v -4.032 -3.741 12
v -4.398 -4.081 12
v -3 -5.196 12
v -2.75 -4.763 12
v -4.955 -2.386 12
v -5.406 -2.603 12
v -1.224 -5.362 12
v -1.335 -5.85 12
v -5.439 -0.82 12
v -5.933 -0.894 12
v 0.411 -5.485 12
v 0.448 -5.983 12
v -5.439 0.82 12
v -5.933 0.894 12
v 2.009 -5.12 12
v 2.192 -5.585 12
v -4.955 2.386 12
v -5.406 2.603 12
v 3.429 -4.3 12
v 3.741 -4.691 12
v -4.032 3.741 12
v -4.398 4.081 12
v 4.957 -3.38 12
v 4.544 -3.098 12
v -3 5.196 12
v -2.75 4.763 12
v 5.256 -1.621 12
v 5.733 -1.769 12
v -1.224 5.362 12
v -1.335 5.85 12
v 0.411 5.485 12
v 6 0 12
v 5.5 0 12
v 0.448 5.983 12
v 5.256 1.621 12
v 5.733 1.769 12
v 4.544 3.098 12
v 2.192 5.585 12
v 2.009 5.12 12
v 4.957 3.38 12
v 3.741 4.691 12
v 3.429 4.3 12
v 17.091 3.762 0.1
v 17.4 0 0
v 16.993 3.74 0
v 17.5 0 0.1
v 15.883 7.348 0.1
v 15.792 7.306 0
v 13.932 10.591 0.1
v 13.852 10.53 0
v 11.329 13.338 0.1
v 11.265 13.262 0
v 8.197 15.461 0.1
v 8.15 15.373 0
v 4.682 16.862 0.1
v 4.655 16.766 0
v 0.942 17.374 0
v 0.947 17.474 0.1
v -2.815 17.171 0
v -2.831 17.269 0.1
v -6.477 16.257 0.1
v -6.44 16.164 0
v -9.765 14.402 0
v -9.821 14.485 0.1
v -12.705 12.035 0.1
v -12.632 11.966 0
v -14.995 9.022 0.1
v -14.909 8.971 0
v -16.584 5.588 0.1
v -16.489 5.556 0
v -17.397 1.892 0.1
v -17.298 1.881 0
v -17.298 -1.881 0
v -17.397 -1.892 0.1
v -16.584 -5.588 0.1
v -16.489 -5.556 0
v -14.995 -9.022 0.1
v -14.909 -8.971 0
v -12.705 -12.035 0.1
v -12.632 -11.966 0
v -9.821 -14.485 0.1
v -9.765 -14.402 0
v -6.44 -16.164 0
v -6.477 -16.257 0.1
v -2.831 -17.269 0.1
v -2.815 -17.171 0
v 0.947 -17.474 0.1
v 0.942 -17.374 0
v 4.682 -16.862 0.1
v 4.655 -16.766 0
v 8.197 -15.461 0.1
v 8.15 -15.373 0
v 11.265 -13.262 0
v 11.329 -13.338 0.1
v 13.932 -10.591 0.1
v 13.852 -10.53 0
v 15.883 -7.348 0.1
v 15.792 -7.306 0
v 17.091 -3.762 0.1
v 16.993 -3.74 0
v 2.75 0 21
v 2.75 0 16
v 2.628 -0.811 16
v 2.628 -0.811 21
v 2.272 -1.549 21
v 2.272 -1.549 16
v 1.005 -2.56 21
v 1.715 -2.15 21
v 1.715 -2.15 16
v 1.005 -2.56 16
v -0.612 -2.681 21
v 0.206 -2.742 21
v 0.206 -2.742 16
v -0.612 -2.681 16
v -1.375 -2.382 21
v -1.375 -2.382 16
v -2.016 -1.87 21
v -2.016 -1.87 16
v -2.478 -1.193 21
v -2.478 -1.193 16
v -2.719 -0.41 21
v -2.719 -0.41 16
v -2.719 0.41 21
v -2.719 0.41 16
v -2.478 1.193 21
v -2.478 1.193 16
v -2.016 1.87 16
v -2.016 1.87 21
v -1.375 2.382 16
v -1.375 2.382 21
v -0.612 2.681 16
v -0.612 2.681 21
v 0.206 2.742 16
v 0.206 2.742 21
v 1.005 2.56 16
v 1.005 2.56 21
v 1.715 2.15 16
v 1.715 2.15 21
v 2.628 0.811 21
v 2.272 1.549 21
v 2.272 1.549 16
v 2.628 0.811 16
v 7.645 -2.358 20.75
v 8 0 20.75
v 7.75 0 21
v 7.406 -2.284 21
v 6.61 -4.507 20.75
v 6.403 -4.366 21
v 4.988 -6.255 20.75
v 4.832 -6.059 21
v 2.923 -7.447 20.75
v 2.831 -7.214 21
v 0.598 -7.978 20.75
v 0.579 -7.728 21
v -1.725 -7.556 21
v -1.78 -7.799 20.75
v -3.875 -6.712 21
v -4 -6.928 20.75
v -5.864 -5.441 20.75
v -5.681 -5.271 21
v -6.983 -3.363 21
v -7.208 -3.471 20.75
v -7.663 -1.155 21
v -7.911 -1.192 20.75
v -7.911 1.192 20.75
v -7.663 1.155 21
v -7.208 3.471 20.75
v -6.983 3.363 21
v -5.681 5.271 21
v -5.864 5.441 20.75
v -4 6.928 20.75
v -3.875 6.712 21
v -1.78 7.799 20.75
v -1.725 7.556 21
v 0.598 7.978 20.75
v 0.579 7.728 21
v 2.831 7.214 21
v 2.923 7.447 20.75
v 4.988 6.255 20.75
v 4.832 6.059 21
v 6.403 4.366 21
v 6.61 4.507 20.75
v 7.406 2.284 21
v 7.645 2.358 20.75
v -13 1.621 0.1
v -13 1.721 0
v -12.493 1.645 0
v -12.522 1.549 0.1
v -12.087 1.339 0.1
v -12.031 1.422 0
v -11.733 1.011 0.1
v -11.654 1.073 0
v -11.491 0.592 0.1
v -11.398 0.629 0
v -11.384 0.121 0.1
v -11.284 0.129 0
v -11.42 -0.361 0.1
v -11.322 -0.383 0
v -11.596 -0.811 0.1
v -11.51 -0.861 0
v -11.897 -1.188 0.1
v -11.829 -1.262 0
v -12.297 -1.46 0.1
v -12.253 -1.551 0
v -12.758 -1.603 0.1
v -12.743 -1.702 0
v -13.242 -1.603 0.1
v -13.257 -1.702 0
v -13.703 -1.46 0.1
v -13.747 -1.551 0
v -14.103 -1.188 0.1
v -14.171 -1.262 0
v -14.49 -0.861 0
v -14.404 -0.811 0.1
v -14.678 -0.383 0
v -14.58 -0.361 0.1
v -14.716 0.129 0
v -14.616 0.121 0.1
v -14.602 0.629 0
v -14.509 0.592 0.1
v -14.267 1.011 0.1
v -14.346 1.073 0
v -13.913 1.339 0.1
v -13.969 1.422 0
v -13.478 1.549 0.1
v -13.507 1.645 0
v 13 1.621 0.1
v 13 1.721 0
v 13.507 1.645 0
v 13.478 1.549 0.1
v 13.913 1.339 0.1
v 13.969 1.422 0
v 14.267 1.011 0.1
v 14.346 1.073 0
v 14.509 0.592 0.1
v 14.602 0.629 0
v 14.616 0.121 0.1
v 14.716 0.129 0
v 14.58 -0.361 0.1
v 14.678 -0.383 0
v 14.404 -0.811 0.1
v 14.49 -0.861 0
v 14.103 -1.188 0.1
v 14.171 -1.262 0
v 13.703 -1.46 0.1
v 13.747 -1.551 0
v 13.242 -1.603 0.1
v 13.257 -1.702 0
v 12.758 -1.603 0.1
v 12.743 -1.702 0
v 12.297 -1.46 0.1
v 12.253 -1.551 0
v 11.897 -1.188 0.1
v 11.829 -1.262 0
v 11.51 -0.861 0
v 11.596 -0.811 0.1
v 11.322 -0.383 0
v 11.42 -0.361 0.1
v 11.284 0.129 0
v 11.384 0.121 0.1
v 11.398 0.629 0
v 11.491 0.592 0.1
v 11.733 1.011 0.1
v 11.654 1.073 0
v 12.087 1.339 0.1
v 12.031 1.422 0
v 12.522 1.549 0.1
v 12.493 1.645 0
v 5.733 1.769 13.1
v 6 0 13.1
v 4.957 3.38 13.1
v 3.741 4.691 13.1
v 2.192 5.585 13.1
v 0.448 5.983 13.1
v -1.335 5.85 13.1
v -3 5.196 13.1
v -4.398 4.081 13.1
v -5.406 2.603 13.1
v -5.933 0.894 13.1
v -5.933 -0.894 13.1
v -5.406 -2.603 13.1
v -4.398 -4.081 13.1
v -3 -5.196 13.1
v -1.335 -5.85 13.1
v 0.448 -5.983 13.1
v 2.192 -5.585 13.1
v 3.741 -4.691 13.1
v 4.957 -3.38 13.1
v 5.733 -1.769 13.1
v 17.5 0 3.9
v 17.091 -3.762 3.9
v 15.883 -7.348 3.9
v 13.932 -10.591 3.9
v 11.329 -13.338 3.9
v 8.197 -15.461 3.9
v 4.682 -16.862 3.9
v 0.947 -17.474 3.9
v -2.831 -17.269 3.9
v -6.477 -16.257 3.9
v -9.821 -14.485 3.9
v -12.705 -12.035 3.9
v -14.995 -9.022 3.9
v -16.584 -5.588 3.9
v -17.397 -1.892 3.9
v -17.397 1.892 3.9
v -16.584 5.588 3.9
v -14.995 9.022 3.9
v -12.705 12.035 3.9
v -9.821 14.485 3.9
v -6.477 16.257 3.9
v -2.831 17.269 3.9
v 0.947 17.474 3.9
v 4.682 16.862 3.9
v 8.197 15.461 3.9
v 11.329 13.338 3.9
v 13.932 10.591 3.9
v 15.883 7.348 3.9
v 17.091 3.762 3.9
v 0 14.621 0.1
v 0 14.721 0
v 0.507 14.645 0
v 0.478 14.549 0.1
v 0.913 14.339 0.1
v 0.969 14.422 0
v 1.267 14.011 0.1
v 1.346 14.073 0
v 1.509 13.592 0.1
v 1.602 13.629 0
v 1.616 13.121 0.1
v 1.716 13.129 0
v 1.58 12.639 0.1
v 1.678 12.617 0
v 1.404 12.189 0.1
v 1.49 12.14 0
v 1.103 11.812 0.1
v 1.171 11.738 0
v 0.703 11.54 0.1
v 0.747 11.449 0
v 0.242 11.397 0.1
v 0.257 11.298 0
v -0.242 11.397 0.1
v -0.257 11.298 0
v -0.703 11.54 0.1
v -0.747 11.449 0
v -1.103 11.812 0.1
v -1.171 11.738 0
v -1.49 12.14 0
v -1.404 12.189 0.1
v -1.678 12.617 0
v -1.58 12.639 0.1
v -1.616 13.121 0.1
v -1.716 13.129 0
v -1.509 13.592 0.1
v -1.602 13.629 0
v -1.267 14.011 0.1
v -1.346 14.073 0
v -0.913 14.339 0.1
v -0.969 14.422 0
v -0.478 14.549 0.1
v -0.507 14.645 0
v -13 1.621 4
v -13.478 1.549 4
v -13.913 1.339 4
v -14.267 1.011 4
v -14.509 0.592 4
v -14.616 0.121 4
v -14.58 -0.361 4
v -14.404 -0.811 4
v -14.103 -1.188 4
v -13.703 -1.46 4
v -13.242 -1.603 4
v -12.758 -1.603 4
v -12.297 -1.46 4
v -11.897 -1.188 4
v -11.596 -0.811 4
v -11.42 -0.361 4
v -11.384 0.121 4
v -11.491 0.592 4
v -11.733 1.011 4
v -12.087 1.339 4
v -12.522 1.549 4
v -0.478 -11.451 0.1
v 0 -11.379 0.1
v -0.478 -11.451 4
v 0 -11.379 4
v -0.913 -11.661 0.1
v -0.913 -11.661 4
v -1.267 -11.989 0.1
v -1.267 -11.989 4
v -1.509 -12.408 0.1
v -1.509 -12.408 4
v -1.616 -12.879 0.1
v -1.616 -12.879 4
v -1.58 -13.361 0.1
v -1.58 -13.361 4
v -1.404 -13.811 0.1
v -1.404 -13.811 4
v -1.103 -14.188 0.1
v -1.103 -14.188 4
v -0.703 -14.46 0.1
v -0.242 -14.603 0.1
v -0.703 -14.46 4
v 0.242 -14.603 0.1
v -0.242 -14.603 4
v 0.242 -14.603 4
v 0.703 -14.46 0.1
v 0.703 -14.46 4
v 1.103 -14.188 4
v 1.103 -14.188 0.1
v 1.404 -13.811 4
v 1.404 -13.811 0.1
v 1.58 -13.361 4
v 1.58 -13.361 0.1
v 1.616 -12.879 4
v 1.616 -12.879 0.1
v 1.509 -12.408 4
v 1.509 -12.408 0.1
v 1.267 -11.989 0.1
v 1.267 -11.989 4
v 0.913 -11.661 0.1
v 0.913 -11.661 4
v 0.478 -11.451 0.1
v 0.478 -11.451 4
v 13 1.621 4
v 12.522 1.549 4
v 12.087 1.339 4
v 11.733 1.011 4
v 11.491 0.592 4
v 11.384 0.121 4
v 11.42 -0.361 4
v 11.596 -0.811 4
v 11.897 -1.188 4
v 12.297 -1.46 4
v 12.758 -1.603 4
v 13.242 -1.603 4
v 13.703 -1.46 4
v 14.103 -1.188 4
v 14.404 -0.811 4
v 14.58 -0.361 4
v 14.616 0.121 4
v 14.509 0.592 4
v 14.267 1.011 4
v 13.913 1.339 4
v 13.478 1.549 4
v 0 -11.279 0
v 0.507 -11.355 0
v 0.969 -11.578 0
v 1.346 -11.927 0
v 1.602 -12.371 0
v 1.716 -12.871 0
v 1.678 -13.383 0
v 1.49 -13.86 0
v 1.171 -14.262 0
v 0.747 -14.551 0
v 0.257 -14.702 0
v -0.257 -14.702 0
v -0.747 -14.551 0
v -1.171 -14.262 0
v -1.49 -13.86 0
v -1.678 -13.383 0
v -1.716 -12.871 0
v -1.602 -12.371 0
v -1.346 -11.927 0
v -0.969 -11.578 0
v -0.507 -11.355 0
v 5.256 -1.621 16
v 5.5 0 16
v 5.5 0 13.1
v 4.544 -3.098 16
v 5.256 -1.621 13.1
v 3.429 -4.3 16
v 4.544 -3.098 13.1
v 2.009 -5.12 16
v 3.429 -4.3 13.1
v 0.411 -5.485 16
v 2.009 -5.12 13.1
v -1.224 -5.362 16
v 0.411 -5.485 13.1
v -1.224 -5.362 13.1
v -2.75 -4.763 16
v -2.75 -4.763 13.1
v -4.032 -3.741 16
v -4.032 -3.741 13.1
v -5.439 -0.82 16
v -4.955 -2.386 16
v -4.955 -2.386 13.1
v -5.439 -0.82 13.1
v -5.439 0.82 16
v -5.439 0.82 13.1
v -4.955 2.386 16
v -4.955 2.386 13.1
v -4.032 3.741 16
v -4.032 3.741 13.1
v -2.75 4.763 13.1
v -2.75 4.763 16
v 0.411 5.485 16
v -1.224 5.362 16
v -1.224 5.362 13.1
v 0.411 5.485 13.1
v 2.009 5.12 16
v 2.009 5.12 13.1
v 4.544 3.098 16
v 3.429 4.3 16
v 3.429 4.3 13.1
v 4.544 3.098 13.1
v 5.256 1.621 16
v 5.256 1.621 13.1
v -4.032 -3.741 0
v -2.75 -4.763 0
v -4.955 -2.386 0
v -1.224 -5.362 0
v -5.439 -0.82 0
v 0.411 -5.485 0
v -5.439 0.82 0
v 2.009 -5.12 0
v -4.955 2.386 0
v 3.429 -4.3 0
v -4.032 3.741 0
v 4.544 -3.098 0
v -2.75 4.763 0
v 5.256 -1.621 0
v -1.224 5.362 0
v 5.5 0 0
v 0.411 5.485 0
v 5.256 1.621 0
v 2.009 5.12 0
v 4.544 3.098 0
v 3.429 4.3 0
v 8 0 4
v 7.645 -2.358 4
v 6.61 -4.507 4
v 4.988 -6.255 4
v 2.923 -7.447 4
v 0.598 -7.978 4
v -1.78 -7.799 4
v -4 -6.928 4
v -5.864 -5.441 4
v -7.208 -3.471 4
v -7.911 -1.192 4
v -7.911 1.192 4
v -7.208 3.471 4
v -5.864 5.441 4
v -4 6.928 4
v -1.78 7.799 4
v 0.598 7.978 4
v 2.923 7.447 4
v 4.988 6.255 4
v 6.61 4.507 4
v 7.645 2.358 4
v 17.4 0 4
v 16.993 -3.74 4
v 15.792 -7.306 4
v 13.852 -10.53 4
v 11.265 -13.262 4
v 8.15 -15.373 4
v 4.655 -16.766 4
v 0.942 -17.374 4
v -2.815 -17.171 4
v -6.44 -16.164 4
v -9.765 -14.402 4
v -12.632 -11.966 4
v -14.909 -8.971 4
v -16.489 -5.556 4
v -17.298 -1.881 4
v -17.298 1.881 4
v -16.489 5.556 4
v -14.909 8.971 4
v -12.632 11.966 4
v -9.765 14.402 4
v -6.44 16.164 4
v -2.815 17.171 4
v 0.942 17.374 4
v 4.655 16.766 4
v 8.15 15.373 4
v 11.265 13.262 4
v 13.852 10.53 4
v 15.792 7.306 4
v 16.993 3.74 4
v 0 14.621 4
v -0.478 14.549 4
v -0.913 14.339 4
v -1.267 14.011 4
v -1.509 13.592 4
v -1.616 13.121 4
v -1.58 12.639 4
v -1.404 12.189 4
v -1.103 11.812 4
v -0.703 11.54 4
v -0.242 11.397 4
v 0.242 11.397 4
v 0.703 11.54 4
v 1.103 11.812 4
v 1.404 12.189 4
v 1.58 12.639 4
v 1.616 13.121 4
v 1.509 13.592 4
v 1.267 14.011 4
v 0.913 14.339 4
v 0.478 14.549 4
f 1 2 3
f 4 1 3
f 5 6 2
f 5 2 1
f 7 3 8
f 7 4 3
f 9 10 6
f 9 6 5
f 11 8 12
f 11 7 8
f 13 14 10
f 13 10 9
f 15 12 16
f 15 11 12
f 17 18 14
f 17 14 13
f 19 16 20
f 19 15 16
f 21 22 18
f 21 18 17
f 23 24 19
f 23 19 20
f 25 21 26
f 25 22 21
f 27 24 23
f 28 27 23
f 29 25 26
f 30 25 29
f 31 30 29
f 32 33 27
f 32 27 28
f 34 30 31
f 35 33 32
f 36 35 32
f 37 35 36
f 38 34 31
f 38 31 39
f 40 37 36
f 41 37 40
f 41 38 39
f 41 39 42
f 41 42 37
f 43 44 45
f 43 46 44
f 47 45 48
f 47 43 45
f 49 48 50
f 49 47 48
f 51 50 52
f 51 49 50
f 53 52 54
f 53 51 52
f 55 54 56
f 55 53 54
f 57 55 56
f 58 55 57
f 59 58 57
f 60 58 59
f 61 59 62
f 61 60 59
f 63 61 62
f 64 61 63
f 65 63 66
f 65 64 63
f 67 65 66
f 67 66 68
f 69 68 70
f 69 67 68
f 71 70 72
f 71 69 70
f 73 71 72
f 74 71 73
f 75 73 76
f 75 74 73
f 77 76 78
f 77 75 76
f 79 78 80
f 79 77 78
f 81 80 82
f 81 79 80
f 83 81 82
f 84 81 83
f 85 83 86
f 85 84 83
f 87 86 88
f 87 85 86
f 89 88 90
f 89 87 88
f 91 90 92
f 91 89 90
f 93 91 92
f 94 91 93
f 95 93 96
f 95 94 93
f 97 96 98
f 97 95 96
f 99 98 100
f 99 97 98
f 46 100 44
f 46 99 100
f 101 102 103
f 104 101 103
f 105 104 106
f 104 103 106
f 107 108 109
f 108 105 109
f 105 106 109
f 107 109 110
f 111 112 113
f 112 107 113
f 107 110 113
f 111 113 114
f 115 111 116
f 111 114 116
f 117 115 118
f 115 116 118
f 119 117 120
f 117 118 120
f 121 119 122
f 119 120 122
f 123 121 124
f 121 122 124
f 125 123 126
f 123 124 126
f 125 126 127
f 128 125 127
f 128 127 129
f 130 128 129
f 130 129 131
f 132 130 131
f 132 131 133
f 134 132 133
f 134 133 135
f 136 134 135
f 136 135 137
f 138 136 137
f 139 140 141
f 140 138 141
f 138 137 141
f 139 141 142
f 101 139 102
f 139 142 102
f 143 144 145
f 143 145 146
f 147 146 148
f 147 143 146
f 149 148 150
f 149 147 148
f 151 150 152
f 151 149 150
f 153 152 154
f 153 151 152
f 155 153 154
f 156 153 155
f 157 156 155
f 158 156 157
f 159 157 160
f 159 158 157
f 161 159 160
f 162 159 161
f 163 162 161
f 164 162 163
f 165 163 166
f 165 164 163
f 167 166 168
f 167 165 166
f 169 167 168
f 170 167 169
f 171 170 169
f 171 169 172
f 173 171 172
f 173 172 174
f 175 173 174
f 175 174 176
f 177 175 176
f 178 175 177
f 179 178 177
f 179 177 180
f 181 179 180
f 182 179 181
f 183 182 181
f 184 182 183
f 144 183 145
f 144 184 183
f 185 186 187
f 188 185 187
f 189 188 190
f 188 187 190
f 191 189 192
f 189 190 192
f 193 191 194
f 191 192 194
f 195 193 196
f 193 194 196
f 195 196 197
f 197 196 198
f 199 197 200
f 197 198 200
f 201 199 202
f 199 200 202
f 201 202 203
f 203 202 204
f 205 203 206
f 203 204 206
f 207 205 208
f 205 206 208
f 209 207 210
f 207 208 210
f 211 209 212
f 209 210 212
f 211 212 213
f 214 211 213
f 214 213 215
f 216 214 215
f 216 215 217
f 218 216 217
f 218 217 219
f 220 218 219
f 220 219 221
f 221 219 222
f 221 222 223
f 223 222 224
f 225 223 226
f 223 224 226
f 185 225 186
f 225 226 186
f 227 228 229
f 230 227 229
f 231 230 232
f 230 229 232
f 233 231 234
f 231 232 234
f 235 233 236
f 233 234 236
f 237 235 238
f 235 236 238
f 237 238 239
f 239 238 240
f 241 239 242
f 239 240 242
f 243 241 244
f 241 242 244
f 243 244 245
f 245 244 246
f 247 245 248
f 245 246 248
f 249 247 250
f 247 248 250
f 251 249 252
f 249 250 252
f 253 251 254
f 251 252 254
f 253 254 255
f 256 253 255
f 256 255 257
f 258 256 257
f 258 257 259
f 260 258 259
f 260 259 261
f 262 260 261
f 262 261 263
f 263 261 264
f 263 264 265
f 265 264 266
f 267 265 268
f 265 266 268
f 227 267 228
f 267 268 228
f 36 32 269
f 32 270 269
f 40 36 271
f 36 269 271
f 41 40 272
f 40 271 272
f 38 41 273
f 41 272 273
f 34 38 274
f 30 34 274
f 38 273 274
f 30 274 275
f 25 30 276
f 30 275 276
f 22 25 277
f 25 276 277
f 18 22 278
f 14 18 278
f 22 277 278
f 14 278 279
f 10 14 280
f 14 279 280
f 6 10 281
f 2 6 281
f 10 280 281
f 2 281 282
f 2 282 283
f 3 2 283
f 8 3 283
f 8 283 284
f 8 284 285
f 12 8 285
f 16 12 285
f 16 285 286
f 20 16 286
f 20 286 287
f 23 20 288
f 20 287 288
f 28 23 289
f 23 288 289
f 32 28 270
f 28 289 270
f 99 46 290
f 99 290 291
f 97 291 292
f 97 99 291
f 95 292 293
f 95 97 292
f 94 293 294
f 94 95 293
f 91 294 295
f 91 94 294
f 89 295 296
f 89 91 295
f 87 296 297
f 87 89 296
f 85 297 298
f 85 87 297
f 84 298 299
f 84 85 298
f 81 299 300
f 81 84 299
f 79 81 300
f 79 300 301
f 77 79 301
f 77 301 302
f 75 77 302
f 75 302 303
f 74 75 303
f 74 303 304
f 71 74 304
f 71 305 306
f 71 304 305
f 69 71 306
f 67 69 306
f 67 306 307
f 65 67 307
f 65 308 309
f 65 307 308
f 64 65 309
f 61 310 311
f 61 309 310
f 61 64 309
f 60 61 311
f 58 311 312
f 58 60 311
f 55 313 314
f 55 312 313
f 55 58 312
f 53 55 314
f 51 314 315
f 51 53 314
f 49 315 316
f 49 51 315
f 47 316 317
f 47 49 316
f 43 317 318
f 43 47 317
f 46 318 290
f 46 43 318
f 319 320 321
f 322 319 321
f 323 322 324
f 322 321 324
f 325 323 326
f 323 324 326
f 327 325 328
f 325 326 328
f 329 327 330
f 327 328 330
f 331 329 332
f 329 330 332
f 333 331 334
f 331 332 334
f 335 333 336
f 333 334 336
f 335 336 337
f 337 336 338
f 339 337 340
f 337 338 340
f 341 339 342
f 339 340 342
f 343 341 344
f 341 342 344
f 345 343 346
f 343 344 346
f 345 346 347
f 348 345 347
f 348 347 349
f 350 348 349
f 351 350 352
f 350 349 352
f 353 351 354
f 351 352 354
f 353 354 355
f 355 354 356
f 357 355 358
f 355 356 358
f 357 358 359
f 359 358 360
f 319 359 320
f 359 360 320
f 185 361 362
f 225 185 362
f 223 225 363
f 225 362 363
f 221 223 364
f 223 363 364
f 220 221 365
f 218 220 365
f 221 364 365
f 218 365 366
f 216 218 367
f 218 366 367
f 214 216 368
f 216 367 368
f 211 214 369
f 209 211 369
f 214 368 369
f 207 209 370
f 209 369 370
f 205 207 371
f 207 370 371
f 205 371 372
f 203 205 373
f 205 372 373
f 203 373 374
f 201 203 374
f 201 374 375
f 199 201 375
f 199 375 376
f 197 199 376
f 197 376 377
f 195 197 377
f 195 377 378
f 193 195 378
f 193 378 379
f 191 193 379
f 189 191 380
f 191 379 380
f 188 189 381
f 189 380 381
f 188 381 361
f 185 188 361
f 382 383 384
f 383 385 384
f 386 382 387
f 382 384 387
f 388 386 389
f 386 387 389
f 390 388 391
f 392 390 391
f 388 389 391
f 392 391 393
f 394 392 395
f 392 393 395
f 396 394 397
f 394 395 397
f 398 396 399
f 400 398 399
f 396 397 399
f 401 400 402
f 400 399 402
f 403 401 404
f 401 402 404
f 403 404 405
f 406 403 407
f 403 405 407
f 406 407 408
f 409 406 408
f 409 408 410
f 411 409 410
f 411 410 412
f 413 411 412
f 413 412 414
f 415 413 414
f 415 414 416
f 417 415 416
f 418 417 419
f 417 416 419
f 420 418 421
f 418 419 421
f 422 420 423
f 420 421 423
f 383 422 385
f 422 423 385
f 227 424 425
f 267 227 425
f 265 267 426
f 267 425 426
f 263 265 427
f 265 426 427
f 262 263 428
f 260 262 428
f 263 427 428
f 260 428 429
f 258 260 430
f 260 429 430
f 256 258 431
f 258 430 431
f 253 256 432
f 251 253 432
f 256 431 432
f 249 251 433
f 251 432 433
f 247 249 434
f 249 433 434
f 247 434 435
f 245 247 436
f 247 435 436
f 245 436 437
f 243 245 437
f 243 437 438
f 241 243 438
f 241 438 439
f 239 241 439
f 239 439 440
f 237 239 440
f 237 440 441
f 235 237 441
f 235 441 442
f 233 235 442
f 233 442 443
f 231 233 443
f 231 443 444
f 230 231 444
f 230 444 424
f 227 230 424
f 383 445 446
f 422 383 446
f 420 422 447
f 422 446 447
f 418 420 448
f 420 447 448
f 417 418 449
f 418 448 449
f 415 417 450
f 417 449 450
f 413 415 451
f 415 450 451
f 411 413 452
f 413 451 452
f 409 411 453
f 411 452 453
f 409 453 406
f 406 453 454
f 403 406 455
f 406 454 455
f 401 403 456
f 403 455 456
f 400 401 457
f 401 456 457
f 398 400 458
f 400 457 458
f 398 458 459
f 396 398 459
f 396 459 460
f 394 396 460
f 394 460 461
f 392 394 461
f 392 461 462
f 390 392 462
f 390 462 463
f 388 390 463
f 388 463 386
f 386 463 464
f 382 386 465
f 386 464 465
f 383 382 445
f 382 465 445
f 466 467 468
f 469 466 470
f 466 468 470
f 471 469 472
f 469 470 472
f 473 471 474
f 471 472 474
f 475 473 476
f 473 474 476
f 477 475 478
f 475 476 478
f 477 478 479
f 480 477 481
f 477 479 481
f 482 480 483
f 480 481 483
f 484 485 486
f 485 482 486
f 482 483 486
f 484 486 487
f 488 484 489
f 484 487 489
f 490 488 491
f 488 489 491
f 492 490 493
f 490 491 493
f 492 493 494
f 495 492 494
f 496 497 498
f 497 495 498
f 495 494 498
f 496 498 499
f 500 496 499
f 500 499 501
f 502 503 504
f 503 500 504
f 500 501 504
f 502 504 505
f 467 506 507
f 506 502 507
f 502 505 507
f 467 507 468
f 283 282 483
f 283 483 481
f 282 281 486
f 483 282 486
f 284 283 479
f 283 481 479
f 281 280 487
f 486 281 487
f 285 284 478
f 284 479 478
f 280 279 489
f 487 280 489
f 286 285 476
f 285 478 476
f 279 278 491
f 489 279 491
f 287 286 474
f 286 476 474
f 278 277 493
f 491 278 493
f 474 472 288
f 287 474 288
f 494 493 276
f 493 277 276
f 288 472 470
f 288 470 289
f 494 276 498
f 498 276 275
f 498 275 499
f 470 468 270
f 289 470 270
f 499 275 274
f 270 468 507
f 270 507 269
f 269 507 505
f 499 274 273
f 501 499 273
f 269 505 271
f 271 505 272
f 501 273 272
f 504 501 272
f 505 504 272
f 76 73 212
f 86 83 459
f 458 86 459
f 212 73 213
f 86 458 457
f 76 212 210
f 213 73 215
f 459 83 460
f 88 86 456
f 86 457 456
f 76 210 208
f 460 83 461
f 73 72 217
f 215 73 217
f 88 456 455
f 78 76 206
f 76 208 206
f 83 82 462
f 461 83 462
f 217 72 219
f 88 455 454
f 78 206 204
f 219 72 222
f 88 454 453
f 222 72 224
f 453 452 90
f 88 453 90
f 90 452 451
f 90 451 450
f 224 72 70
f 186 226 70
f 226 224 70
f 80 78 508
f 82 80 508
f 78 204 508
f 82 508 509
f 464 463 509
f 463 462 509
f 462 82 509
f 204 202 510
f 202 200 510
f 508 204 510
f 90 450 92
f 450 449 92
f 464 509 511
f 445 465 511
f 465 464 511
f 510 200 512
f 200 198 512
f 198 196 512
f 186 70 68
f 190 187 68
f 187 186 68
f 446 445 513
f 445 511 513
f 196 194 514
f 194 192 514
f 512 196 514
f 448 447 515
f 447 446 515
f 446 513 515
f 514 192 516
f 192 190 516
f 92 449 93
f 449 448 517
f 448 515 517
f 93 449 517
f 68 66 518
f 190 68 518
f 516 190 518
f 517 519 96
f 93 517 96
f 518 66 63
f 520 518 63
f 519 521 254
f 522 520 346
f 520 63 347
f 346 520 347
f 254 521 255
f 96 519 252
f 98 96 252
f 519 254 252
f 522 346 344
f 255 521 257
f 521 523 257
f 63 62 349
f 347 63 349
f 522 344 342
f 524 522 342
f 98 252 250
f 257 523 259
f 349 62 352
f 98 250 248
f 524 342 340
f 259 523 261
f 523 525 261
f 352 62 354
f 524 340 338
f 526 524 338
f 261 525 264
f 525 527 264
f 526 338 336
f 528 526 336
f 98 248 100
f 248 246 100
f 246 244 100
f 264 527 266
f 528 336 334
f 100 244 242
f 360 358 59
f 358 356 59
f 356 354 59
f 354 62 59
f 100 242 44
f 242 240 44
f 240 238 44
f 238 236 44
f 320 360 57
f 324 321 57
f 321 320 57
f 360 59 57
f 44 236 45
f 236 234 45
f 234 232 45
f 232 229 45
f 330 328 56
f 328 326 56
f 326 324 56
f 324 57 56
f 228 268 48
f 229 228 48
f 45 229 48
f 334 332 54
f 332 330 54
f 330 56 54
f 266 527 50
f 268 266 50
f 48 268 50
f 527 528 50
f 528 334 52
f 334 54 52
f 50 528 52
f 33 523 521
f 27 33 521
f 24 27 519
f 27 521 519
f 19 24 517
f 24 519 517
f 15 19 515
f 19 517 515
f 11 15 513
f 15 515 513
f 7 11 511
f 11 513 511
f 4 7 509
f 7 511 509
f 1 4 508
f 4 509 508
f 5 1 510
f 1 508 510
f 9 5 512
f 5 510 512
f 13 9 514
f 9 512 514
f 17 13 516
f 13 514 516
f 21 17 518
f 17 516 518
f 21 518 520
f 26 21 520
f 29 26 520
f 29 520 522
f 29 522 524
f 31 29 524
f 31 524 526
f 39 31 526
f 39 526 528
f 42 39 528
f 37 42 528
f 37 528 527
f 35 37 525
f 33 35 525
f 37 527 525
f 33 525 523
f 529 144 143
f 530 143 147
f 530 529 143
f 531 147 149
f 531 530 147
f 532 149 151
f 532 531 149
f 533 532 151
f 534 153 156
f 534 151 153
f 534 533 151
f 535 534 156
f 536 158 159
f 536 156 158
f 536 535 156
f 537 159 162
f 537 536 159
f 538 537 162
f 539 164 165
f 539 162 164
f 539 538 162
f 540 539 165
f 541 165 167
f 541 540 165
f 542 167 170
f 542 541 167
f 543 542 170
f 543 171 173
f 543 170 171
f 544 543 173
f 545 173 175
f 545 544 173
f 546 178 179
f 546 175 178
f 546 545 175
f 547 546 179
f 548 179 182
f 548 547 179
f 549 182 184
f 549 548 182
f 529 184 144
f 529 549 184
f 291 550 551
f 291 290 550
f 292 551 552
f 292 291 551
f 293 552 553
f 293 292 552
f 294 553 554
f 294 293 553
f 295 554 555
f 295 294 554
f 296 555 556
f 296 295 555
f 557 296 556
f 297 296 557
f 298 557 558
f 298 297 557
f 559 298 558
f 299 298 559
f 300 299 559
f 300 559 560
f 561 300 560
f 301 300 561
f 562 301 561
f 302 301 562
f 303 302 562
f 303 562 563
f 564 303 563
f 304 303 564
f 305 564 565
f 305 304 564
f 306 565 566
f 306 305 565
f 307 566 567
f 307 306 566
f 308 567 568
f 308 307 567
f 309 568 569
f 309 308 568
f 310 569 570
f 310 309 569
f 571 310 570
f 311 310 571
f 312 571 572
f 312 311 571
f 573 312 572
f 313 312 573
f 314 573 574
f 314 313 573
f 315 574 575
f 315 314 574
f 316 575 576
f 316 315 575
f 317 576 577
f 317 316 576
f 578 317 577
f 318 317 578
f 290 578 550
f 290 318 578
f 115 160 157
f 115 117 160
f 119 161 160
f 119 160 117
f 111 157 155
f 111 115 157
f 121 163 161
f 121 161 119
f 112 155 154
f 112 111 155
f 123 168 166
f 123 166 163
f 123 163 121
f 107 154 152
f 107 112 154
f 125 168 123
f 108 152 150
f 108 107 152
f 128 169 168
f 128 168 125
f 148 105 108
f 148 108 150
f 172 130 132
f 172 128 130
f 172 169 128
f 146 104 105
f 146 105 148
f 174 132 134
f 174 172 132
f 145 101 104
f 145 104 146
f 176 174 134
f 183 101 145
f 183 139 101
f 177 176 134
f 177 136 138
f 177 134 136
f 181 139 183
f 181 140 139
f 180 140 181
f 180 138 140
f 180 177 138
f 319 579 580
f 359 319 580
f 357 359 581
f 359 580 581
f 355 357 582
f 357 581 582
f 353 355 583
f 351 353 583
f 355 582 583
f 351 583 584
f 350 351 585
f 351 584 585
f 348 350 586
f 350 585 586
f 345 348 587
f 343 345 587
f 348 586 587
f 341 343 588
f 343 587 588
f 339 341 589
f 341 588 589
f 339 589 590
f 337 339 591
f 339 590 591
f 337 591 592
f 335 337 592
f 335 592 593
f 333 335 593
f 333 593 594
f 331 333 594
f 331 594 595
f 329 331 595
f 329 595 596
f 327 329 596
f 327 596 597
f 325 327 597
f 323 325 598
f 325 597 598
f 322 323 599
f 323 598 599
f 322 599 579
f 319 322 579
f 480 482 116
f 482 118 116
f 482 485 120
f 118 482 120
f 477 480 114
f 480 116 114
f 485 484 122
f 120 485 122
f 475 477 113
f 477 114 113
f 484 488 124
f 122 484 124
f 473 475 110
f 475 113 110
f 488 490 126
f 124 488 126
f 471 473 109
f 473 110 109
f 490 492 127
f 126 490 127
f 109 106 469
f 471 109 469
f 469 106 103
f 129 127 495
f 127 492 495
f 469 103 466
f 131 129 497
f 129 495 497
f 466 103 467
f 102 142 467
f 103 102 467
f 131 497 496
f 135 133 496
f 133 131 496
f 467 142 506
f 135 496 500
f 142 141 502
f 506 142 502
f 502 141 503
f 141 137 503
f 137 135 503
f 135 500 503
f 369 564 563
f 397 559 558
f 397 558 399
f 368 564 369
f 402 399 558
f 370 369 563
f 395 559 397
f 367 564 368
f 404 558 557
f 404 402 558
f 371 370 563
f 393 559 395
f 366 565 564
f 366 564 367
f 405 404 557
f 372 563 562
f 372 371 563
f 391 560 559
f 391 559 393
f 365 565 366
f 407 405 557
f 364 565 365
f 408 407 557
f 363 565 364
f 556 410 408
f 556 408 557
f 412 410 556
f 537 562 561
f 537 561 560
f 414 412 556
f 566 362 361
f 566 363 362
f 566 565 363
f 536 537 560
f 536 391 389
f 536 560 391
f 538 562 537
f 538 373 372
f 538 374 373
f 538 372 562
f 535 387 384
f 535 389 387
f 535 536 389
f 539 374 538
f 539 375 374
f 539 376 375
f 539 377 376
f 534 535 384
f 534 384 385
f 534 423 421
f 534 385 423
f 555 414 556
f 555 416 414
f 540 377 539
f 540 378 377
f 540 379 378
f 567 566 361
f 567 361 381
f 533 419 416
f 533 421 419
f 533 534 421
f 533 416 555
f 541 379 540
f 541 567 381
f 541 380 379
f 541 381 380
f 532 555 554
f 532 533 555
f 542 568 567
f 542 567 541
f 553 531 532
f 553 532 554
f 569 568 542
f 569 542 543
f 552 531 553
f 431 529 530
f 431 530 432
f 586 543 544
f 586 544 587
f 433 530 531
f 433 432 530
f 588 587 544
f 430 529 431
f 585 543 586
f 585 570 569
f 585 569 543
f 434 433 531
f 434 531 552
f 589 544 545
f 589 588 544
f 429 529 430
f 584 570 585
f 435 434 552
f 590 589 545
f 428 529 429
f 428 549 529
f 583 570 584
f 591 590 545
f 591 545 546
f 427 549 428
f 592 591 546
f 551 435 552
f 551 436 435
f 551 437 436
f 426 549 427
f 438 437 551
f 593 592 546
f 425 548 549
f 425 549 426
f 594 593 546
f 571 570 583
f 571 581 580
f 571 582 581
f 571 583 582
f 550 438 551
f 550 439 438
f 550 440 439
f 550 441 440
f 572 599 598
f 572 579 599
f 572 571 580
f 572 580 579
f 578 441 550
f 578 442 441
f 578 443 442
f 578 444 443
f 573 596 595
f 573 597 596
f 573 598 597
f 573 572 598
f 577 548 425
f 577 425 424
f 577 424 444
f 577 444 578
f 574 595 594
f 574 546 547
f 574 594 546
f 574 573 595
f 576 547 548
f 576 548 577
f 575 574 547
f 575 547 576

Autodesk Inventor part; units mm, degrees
ref_plane "YZ Plane" through (0, 0, 0) normal (1, 0, 0) x (0, 1, 0)
ref_plane "XZ Plane" through (0, 0, 0) normal (0, 1, 0) x (-1, 0, 0)
sketch "Sketch1" plane through (0, 0, 0) normal (0, 0, 1) x (1, 0, 0)
  circle A0 centre (0, 0) radius 17.5
  circle A1 centre (0, 0) radius 8
  circle A2 centre (0, 0) radius 5.5
  circle A3 centre (0, 0) radius 2.75
  circle A4 centre (0, 0) radius 13 construction
  point P0 (0, 13)
  point P1 (-13, 0)
  point P2 (0, -13)
  point P3 (13, 0)
  dimension "d10" = 26
  dimension "d0" = 35
  dimension "d1" = 16
  dimension "d2" = 11
  dimension "d3" = 5.5
  dimension "d13" = 360
extrude "Extrusion1" add sketch "Sketch1" along normal blind 4 contours A0 | A1 | A2
extrude "Extrusion2" add sketch "Sketch1" along normal blind 21 contours A1 | A2
extrude "Extrusion3" cut sketch "Sketch1" along normal blind 16 contours A2
hole "Hole1" at (0, -13, 0) at (13, 0, 0) at (0, 13, 0) at (-13, 0, 0) direction (0, 0, 1) diameter 3.242 end through all thread size "M4x0.7" class "6H" standard "ISO Metric profile"
ref_plane "Work Plane1" through (0, 0, 13.1) normal (0, 0, 1) x (1, 0, 0)
sketch "Sketch2" plane through (0, 0, 13.1) normal (0, 0, 1) x (1, 0, 0)
  circle A0 centre (0, 0) radius 6
  dimension "d23" = 12
extrude "Extrusion4" cut sketch "Sketch2" against normal blind 1.1
chamfer "Chamfer1" distance 0.25 angle 45 1 edges at (-8, 0, 21)
chamfer "Chamfer2" distance 0.1 angle 45 6 edges at (-17.5, 0, 4) (-17.5, 0, 0) (-13, -1.621, 0) (0, -14.621, 0) (0, 11.379, 0) (13, -1.621, 0)
properties part number "BearingSuport"
